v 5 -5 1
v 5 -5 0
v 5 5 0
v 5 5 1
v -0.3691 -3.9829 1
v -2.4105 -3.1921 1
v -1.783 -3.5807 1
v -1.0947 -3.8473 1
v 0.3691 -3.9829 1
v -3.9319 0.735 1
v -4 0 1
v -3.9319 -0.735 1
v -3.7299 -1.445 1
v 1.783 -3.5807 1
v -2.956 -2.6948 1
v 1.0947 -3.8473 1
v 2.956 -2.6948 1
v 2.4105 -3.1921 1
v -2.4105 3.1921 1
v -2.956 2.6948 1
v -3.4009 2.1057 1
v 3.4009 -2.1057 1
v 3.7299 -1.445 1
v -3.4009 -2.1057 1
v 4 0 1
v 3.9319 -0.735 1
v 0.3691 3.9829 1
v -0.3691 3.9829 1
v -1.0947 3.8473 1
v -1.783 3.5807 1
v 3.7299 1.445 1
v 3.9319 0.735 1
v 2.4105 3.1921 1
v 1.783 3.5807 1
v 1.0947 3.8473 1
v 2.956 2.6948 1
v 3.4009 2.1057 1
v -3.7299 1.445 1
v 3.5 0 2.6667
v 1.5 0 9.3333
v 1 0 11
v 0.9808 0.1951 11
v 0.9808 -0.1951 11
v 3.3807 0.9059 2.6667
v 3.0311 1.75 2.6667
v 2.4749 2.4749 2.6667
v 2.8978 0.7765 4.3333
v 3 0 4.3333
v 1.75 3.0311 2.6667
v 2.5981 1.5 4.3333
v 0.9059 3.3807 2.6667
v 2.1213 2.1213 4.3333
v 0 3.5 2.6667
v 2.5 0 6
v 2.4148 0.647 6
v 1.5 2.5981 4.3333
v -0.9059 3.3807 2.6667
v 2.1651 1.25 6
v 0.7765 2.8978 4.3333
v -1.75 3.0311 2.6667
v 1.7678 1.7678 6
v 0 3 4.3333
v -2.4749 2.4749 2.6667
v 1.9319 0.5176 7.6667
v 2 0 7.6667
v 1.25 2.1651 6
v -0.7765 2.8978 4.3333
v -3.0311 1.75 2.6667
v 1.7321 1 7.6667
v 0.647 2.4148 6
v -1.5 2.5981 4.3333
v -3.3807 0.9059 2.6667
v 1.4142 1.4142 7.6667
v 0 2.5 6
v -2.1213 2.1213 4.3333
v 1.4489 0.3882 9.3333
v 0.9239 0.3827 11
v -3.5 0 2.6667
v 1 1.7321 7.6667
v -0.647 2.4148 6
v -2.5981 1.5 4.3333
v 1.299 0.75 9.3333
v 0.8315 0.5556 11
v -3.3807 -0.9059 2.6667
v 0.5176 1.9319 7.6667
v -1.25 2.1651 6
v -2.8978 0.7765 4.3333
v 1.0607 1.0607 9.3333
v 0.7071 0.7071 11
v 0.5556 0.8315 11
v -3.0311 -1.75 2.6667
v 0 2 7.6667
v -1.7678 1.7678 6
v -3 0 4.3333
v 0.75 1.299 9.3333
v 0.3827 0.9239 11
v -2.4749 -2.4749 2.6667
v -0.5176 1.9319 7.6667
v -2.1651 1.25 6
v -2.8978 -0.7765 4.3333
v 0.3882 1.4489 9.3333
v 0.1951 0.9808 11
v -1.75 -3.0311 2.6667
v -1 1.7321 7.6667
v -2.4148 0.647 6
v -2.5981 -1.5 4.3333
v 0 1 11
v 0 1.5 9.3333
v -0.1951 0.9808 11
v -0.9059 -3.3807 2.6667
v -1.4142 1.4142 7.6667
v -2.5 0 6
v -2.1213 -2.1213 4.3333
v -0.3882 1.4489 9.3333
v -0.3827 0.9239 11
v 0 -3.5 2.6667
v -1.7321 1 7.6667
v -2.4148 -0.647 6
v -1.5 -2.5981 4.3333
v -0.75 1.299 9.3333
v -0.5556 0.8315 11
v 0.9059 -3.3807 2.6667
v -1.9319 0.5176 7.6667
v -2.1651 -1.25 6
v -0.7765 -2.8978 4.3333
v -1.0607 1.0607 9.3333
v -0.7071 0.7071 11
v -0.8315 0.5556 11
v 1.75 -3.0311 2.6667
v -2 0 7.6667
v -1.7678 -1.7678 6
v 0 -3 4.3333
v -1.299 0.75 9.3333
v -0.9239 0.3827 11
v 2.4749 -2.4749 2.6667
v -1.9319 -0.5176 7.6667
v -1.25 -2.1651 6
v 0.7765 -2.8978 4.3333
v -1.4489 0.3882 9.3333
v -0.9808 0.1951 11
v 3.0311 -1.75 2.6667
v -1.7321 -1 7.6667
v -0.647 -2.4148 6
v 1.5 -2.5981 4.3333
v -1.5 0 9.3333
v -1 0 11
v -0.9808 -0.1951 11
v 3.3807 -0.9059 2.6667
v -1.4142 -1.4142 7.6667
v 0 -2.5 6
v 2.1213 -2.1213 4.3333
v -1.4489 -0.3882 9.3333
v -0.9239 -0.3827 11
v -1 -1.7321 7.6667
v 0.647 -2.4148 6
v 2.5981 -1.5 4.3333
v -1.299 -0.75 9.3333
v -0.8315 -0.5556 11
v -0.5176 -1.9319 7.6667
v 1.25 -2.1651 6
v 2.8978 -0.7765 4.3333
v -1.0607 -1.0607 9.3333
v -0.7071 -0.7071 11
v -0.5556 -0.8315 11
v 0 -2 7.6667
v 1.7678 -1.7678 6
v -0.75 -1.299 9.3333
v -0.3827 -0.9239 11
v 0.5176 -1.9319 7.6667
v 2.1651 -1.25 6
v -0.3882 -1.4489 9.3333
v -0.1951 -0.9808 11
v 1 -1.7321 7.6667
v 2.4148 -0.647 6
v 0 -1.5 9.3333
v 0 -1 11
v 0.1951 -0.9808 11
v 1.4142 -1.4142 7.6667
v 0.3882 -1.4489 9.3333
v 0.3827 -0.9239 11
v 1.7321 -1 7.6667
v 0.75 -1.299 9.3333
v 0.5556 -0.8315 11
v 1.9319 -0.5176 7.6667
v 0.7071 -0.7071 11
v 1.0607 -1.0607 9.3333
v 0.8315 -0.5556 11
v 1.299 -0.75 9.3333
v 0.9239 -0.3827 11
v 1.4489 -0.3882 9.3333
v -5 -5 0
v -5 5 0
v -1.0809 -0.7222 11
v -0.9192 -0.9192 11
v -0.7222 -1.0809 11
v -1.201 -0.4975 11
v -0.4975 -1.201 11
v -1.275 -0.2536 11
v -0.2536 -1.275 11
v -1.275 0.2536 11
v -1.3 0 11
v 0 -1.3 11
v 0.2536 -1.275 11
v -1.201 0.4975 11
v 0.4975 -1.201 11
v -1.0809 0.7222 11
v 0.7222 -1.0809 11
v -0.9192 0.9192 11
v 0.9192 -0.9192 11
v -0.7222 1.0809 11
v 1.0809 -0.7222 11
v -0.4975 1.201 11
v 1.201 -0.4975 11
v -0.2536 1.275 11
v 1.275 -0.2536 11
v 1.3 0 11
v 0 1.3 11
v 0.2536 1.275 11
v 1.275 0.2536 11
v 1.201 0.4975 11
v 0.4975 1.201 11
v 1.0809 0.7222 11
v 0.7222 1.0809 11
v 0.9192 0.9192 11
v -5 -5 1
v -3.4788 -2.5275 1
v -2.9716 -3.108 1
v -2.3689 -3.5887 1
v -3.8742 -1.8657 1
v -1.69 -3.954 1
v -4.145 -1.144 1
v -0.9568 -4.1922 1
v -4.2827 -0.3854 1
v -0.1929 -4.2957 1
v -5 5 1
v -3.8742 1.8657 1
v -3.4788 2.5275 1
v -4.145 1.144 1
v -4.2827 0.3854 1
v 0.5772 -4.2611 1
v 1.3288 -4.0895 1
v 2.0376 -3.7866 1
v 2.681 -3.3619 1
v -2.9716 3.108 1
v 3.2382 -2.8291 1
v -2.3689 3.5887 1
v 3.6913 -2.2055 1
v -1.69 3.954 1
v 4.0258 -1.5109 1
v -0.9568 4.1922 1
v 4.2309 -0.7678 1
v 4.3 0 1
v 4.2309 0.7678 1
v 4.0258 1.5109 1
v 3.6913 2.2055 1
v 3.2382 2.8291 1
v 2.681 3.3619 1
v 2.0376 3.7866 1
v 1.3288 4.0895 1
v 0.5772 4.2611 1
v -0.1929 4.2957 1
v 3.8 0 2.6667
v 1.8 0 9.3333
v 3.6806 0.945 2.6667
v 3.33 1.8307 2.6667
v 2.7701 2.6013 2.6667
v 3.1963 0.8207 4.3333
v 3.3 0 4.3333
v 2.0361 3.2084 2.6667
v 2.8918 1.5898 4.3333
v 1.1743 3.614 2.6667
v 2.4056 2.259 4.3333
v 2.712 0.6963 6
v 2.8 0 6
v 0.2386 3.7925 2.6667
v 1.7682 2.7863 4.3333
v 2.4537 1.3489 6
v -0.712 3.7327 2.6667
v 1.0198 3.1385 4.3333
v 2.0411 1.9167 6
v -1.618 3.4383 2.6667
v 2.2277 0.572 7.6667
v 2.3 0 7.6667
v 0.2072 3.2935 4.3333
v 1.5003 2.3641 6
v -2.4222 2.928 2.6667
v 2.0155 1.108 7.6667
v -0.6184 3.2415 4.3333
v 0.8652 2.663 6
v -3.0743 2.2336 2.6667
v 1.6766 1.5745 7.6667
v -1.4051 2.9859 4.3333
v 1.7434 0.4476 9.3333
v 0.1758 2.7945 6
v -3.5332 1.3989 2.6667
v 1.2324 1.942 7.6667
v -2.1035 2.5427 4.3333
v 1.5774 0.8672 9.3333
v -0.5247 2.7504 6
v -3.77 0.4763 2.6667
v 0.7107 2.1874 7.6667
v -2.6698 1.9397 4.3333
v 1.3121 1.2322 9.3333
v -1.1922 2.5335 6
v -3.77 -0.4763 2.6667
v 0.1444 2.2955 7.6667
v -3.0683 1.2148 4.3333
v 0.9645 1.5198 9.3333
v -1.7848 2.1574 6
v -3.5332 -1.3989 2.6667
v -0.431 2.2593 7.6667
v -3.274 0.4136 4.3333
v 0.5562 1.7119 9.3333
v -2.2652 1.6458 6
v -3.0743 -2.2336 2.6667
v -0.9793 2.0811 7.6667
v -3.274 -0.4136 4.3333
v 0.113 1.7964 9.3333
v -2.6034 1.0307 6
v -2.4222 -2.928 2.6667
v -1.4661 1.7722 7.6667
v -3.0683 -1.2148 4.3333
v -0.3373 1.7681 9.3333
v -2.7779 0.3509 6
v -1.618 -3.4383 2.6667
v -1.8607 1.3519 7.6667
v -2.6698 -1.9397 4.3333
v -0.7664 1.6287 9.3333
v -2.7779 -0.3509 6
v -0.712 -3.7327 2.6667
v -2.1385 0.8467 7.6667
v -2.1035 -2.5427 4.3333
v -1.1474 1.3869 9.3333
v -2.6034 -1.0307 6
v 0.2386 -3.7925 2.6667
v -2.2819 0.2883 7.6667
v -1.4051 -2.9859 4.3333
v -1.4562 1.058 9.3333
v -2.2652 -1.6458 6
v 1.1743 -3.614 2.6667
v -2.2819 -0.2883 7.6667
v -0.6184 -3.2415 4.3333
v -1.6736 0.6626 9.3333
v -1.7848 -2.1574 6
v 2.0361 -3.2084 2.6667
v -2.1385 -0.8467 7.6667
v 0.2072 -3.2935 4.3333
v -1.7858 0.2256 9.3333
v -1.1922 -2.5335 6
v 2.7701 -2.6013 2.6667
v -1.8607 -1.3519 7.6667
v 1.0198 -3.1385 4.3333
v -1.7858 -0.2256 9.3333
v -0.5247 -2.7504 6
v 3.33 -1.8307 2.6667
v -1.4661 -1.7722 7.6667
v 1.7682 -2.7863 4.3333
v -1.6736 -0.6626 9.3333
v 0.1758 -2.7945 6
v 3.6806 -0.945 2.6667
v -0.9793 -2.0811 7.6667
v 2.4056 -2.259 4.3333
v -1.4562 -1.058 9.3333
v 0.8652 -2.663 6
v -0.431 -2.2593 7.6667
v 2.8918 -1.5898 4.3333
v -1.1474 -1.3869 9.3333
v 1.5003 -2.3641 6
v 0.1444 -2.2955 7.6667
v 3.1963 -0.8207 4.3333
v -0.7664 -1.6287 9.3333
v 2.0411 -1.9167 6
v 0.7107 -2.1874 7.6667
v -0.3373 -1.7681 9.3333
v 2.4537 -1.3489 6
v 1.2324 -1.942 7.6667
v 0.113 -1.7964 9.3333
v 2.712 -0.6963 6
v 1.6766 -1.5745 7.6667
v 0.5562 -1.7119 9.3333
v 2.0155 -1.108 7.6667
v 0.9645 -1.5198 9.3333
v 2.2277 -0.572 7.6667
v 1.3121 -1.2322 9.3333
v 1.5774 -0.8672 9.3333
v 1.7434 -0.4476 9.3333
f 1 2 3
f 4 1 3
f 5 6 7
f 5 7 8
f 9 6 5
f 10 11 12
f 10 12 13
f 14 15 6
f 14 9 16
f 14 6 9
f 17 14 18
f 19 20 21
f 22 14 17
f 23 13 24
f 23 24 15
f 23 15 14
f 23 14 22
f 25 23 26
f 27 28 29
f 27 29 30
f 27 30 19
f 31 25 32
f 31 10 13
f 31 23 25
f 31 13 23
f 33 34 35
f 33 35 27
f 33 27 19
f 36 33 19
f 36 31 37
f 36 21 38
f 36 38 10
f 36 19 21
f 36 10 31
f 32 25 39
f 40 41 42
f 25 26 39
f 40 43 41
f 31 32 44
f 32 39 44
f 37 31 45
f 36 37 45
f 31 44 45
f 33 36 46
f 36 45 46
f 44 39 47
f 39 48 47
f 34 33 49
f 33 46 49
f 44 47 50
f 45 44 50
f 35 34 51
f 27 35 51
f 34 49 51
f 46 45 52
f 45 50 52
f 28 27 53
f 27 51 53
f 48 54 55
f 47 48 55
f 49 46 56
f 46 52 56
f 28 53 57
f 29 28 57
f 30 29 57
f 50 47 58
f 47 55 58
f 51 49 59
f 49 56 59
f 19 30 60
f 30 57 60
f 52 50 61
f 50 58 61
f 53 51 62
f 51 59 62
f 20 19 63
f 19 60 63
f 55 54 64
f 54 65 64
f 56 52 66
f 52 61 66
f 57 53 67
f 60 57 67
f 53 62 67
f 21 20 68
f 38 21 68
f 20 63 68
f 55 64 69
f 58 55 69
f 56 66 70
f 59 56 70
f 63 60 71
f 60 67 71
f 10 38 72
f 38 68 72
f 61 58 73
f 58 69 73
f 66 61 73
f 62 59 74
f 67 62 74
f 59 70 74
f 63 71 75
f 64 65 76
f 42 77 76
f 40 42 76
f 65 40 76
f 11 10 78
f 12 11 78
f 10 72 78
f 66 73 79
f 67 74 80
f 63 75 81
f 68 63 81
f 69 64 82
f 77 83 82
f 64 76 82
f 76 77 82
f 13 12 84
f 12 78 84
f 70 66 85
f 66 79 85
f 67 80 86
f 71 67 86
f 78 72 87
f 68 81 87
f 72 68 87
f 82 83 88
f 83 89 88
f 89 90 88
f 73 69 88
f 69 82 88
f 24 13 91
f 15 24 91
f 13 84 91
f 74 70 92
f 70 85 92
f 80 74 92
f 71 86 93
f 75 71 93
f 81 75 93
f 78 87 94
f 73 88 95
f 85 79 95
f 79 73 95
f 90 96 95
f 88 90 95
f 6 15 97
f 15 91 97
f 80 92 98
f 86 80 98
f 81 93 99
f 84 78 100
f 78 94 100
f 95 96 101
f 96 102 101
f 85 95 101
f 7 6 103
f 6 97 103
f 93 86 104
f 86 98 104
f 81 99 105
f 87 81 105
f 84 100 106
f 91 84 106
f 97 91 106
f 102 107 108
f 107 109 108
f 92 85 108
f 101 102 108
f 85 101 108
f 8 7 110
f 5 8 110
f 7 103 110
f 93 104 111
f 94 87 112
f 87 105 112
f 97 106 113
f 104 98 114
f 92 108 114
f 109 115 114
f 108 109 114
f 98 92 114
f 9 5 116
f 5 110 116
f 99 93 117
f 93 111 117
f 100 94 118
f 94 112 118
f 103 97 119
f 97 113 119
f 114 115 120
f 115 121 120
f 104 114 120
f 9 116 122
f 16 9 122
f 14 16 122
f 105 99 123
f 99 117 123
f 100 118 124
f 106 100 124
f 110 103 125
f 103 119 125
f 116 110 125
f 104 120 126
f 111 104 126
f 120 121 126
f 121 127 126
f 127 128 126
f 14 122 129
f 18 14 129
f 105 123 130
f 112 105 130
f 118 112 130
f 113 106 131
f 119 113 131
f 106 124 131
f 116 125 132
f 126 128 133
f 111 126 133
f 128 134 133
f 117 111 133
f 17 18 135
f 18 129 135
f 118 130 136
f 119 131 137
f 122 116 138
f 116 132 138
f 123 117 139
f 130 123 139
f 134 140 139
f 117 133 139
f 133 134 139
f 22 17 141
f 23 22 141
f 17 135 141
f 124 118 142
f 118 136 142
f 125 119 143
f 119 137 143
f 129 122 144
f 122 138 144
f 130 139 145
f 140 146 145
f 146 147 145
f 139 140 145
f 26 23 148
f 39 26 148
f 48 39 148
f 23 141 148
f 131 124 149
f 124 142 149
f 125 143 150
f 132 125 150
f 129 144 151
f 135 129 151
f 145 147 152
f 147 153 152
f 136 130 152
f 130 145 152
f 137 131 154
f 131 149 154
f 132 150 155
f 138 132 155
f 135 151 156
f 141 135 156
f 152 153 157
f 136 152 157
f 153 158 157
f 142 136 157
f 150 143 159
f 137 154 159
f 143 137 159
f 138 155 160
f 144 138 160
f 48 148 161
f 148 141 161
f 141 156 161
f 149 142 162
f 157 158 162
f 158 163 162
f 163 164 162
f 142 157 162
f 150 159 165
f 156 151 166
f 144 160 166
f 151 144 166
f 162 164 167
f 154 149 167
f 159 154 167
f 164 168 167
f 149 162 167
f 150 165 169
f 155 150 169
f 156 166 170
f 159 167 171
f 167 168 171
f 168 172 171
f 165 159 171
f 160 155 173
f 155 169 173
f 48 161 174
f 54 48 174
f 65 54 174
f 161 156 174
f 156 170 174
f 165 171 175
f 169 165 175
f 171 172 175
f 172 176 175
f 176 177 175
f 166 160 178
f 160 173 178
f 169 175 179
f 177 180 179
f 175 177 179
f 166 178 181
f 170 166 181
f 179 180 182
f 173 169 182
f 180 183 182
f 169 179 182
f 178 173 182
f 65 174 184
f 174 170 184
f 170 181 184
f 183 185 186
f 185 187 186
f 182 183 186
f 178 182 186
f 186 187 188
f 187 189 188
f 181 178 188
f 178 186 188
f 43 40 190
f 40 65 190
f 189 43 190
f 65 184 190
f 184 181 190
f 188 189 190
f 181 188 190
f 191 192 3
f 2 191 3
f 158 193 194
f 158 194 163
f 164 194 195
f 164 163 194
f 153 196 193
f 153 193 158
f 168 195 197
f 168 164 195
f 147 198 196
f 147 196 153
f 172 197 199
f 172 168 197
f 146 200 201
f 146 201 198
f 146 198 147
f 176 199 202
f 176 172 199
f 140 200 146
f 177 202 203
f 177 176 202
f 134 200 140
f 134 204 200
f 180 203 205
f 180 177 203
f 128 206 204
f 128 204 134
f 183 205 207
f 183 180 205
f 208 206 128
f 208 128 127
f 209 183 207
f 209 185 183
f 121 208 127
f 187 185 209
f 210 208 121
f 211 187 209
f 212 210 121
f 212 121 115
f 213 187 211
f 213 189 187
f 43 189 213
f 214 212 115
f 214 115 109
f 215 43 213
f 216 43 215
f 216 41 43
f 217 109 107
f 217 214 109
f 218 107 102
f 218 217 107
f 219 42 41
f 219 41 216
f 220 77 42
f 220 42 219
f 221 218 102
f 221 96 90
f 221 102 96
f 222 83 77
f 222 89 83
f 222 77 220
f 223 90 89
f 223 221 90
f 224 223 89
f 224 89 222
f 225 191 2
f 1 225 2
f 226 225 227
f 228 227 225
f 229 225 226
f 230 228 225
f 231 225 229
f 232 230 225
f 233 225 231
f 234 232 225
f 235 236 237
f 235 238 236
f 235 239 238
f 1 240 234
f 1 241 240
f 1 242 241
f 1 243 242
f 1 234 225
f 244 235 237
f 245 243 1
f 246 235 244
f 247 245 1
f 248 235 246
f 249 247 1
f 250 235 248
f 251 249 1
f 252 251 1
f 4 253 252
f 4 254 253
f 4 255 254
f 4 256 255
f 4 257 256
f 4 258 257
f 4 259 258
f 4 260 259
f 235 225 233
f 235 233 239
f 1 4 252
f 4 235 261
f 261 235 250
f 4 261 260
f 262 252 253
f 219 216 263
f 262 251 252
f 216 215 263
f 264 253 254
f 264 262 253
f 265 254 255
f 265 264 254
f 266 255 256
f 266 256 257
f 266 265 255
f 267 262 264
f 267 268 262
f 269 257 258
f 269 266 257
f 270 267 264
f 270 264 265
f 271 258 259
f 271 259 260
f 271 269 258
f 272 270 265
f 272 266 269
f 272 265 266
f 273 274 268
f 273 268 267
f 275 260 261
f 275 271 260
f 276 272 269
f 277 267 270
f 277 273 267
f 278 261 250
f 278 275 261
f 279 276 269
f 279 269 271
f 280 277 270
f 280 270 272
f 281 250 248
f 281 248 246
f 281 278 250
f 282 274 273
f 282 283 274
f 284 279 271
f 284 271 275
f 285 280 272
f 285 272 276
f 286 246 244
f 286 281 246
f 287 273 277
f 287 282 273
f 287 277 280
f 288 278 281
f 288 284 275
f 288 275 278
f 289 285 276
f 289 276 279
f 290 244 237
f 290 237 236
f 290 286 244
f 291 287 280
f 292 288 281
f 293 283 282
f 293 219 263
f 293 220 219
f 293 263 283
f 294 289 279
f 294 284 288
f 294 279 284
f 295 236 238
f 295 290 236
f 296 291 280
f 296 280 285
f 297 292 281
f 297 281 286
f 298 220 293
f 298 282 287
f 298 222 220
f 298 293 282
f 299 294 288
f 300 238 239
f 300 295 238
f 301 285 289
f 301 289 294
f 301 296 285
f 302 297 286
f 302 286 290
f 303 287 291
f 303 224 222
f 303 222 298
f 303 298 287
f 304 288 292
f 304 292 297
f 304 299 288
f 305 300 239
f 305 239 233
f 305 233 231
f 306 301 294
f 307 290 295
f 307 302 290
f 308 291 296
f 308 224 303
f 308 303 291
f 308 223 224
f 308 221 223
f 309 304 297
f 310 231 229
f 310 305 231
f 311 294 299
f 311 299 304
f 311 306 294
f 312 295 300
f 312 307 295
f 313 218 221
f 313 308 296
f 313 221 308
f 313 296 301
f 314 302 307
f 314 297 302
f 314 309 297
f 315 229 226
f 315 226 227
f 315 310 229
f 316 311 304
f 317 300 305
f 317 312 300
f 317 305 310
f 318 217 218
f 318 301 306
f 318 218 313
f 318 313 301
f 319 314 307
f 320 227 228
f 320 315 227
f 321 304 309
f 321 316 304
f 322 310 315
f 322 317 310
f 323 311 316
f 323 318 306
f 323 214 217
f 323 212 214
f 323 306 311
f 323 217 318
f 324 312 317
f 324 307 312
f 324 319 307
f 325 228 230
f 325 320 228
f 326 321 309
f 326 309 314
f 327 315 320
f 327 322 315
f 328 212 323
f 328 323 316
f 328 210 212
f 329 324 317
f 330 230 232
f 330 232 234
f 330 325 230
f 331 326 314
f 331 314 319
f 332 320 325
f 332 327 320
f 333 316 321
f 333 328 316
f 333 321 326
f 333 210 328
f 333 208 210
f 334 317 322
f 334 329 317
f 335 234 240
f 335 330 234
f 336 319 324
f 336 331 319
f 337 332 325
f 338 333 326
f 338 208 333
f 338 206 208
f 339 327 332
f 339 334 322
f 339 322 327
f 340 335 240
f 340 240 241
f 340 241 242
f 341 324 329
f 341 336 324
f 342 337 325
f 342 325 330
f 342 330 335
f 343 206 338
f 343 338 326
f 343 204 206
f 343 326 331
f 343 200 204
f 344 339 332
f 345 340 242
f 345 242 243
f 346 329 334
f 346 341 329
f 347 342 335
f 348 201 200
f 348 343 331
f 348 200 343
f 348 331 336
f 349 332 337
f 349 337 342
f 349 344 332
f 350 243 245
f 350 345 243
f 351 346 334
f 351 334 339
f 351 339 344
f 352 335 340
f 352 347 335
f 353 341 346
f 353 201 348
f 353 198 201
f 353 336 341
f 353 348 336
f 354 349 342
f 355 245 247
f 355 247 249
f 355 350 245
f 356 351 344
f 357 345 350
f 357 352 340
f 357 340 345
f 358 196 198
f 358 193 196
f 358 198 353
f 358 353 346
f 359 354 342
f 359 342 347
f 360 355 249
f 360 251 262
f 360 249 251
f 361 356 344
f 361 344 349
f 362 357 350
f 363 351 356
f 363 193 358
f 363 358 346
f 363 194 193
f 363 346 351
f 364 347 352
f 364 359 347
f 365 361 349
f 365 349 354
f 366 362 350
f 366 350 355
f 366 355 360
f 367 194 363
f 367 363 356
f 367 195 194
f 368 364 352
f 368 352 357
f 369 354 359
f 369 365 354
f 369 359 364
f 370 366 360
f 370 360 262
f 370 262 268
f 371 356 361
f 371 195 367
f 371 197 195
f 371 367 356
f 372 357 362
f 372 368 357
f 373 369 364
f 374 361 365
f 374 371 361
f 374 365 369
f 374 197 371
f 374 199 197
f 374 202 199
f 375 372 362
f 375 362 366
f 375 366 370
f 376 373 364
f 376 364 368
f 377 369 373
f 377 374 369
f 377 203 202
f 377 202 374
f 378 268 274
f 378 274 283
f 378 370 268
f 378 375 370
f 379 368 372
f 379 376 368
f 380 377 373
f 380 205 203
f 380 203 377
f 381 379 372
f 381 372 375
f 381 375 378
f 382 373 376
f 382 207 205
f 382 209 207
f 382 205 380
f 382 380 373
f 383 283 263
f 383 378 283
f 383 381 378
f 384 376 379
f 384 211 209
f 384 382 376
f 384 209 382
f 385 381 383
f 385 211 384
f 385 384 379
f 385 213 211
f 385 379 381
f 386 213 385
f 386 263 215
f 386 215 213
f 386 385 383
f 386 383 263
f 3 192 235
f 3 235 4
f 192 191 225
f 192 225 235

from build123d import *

# Parameters (mm, degrees)
BOX_W     = 10
BOX_H     = 10
BOX_DEPTH = 1


with BuildPart() as cube:
    # Box → Box (new body)
    with BuildSketch(Plane(origin=(-5, -5, 0), x_dir=(1, 0, 0), z_dir=(0, 0, 1))):
        with Locations((5, 5)):
            Rectangle(BOX_W, BOX_H)
    extrude(amount=BOX_DEPTH)


with BuildPart() as cone:
    # Cone → Cone (revolve)
    with BuildSketch(Plane.XZ):
        Polygon((0, 0), (4, 0), (1, 10), (0, 10), align=None)
    revolve(axis=Axis((0, 0, 0), (0, 0, 1)))


with BuildPart() as fusion:
    # Cone001 → Cone001 (revolve)
    with BuildSketch(Plane.XZ):
        Polygon((0, 0), (4.3, 0), (1.3, 10), (0, 10), align=None)
    revolve(axis=Axis((0, 0, 0), (0, 0, 1)))

    # Cut: cut Cone
    add(cone.part, mode=Mode.SUBTRACT)


with BuildPart() as fusion_1:
    # Cut placement: moved
    add(fusion.part.moved(Location((0, 0, 1))))

    # Fusion: union Cube
    add(cube.part)


solid = fusion_1.part
